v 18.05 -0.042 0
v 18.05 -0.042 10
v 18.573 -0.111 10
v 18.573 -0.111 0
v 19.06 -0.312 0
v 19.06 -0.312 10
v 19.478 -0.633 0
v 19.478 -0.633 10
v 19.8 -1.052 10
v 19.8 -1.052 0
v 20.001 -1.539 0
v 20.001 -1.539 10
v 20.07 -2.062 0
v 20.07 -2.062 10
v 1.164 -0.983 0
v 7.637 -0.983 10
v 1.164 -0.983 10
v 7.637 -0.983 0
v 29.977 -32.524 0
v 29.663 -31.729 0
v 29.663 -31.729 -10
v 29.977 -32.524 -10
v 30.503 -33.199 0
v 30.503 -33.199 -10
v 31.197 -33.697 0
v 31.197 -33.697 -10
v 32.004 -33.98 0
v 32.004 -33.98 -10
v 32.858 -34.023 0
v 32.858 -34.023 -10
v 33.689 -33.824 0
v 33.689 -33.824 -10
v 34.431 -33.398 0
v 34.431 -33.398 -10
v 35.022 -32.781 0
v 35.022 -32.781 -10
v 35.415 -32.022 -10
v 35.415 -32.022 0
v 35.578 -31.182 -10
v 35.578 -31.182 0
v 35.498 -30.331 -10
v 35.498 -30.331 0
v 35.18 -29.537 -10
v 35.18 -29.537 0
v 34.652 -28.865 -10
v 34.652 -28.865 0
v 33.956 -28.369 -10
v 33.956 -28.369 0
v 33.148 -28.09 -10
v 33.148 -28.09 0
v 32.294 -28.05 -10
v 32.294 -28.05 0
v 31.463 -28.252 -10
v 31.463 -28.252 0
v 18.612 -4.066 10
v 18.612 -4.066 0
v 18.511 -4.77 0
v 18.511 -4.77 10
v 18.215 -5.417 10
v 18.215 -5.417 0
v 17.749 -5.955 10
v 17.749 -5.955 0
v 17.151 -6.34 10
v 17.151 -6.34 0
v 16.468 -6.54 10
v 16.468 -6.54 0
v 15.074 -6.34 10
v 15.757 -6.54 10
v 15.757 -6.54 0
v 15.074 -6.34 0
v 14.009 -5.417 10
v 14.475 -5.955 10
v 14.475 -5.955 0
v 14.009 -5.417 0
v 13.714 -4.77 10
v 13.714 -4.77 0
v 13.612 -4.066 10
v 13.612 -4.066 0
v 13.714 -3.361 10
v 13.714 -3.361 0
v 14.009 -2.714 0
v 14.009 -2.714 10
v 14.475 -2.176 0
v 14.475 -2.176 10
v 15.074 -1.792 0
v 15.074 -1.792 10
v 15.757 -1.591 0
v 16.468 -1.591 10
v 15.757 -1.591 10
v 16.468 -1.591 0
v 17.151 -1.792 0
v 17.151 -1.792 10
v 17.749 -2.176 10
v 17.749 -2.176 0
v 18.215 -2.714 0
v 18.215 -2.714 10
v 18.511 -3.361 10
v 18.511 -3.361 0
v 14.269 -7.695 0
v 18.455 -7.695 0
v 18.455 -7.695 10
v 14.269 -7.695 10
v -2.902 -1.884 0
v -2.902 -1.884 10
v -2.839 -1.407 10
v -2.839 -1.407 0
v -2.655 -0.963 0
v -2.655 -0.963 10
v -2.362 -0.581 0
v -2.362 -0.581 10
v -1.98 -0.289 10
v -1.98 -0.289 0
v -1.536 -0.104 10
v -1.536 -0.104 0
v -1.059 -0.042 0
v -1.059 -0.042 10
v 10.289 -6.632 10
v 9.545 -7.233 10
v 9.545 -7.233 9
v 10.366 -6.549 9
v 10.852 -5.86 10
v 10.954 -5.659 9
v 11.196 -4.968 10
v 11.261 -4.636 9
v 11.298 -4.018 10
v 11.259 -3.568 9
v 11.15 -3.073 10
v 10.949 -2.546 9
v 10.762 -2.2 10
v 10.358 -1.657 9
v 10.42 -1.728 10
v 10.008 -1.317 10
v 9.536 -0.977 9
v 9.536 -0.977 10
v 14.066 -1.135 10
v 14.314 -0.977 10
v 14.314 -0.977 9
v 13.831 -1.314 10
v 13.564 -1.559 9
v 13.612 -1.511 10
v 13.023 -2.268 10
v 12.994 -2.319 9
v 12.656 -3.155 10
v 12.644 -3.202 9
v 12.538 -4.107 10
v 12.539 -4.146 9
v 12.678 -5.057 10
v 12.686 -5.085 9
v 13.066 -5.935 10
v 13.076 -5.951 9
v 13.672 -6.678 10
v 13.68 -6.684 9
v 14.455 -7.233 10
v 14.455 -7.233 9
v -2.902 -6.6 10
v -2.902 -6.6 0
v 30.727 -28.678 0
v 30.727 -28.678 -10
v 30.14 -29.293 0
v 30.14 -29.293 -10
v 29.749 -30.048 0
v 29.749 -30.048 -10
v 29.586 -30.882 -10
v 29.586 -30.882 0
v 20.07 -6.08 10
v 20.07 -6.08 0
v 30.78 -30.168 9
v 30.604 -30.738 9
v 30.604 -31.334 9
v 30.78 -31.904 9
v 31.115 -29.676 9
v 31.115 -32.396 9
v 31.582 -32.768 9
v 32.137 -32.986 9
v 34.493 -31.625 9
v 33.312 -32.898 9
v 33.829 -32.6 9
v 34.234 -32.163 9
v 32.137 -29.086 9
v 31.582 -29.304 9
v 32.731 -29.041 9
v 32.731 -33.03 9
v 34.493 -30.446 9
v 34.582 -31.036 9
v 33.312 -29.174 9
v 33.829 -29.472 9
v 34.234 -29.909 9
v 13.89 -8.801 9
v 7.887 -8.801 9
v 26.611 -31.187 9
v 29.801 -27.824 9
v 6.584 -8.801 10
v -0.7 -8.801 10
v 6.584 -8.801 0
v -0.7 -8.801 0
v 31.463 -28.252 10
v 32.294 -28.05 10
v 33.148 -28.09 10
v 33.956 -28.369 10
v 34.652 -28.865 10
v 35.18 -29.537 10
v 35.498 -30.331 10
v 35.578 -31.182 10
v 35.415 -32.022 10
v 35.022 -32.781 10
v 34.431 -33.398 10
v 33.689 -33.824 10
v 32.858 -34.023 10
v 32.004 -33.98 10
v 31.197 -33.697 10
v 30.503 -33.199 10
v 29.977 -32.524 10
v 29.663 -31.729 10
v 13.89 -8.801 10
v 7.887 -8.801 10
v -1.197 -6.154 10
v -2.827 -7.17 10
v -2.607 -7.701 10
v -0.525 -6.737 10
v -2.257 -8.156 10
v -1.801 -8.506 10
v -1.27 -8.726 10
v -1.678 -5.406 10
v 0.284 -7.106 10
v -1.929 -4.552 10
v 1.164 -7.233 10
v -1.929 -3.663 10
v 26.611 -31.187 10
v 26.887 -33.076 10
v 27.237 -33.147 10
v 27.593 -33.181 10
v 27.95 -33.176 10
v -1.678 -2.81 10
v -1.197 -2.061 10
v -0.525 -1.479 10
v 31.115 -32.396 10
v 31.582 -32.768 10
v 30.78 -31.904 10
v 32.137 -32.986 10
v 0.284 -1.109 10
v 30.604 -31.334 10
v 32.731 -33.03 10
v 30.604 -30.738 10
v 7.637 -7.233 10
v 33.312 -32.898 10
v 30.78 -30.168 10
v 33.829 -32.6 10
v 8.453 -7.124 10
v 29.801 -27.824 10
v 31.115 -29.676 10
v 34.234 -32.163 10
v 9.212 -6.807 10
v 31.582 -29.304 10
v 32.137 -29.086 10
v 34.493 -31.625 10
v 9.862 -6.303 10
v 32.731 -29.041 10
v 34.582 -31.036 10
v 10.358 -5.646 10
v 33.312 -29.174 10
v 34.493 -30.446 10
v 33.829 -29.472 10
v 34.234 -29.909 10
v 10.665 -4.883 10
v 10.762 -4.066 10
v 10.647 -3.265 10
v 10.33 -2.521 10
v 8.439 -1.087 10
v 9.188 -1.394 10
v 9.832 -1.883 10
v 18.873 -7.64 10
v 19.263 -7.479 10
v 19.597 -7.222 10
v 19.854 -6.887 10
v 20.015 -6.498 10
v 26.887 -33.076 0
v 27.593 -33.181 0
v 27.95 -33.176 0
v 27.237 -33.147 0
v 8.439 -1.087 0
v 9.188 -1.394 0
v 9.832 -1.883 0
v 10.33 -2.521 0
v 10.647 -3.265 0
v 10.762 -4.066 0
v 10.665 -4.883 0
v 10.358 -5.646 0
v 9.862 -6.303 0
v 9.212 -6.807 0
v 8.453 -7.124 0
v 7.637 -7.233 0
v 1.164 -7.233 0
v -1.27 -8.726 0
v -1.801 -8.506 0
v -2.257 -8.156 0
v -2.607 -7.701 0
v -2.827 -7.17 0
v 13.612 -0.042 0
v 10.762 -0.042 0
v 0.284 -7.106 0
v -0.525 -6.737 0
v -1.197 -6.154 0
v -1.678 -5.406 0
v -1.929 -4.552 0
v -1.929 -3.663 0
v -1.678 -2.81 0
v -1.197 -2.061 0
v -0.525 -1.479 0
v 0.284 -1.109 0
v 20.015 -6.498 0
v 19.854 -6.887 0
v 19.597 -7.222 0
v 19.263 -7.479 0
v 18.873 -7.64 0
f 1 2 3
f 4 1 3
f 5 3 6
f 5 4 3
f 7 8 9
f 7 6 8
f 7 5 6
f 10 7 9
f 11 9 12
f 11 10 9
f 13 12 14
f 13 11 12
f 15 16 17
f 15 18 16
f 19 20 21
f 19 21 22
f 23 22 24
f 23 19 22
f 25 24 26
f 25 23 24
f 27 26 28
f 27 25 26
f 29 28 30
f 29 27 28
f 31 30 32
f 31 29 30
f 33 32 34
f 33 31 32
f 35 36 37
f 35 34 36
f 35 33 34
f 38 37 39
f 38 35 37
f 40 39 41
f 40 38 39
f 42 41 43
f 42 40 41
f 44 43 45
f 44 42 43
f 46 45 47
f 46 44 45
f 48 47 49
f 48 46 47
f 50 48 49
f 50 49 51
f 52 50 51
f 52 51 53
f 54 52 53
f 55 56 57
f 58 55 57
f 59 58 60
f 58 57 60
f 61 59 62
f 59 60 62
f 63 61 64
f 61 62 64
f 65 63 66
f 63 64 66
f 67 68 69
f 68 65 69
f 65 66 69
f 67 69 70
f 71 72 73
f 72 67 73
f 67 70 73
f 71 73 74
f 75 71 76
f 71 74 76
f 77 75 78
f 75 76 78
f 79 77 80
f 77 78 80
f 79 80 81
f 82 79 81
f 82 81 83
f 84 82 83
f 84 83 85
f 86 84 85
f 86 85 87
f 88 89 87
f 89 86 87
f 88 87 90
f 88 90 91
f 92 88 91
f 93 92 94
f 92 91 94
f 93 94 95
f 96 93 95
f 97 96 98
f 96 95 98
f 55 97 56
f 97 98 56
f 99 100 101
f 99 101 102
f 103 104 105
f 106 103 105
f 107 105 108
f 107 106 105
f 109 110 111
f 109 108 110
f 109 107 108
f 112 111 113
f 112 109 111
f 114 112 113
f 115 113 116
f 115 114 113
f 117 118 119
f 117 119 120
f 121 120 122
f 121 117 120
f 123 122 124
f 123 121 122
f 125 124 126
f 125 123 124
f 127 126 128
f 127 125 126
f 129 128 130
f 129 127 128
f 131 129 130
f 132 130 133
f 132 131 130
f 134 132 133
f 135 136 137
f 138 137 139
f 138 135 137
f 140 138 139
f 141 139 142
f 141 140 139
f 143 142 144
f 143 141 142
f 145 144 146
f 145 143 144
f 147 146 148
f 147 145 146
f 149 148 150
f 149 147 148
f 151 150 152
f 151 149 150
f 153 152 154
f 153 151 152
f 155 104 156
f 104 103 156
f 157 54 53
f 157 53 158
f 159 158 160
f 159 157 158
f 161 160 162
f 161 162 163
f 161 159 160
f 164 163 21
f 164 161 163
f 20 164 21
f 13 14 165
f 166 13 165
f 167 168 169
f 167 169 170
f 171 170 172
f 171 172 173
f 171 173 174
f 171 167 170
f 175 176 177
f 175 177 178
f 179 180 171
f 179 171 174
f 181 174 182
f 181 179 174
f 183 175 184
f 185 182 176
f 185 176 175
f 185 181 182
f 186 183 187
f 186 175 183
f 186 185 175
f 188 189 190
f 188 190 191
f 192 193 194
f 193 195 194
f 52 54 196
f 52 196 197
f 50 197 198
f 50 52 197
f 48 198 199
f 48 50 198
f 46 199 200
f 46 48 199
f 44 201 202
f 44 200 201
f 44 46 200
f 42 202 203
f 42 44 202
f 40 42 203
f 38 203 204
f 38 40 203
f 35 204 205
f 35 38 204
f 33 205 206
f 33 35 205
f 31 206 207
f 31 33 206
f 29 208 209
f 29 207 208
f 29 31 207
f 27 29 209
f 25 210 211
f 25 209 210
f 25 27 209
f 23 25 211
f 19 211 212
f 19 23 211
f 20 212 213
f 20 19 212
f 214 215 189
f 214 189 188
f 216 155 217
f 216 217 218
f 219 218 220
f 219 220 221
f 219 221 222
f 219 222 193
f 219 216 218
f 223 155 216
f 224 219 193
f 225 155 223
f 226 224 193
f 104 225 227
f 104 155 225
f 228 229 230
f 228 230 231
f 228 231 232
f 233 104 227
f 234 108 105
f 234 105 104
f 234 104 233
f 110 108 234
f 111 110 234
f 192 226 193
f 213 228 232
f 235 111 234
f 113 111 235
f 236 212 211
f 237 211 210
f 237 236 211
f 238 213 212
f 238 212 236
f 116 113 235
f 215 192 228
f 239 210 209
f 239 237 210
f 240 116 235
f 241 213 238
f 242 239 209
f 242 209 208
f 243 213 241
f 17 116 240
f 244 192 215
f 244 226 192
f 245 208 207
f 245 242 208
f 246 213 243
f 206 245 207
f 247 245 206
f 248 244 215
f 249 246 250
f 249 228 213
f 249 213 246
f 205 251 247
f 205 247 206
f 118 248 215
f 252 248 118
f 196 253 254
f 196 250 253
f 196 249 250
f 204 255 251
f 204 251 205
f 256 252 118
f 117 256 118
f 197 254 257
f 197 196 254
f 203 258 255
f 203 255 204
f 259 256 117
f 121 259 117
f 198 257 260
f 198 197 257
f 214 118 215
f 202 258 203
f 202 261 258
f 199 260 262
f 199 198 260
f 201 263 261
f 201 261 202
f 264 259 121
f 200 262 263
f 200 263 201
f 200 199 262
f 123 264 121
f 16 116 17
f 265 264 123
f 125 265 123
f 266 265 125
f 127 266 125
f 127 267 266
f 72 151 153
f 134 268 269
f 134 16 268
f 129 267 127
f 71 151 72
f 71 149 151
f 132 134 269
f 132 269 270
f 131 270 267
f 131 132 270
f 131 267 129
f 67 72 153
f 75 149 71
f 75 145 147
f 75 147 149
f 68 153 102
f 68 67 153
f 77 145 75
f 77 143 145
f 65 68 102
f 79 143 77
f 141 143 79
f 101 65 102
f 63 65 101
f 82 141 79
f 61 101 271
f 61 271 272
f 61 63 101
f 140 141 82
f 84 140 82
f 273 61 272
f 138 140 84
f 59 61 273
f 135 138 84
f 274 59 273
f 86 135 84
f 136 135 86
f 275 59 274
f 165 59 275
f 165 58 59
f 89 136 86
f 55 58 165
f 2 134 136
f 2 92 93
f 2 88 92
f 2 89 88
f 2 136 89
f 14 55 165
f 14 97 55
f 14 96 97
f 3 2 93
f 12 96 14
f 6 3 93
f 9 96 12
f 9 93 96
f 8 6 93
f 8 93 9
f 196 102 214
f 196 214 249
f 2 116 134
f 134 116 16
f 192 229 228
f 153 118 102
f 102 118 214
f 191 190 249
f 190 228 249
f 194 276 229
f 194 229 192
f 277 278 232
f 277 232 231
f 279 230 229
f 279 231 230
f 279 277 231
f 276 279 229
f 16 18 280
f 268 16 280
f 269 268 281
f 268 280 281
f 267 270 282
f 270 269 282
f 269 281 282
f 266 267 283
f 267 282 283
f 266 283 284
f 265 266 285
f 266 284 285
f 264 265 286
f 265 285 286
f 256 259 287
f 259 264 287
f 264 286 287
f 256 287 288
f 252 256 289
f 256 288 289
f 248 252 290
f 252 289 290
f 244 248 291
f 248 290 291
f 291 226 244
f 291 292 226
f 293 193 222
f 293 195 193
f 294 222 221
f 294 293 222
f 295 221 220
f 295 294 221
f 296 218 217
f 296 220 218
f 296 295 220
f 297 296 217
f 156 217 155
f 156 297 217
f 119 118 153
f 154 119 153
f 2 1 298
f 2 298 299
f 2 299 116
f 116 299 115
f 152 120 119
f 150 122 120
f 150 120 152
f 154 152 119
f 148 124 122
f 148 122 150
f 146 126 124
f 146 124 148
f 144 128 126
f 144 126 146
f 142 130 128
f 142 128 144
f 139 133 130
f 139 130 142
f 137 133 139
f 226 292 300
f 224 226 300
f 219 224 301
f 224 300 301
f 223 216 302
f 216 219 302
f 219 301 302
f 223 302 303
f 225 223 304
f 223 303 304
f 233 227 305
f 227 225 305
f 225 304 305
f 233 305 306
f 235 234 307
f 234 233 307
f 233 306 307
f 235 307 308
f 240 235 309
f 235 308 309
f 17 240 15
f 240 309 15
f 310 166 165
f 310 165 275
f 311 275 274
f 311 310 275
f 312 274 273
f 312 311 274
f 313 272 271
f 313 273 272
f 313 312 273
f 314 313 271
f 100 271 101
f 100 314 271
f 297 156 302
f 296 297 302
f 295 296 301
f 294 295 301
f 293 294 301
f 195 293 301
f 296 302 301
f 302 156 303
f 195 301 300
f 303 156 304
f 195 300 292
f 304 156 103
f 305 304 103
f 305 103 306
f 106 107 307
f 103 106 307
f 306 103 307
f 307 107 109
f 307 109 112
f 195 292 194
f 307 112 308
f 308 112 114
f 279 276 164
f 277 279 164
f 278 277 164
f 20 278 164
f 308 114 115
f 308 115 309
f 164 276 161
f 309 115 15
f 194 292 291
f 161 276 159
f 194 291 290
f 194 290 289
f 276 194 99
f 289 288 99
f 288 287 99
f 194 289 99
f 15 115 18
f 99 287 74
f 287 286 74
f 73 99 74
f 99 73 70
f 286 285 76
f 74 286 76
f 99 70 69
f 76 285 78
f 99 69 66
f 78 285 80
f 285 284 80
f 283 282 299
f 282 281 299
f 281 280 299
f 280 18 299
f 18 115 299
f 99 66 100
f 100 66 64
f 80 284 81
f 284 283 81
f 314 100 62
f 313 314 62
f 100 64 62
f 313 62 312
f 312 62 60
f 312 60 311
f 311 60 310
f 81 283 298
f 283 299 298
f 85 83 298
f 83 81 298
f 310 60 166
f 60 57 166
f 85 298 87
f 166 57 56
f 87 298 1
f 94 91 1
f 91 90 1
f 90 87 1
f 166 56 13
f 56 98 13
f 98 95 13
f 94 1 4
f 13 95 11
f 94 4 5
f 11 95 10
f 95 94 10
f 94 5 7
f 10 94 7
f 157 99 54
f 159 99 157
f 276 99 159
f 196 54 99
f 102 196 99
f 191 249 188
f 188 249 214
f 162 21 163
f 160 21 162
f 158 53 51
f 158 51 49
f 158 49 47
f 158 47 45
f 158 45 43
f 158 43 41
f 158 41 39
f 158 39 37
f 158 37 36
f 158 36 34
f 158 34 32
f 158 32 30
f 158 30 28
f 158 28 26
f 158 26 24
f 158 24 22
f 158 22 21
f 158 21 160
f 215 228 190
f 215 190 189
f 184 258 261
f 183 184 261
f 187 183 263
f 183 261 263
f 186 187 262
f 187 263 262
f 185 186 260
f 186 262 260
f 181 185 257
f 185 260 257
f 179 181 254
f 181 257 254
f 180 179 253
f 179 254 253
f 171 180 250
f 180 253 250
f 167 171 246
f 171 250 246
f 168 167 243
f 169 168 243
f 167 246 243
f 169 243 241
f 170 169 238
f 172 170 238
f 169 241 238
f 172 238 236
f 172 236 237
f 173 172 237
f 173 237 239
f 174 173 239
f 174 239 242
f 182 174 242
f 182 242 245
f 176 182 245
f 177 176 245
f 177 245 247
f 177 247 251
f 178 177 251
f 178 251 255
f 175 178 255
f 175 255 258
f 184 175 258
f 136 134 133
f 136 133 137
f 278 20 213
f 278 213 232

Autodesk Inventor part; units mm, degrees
ref_plane "YZ Plane" through (0, 0, 0) normal (1, 0, 0) x (0, 1, 0)
ref_plane "XZ Plane" through (0, 0, 0) normal (0, 1, 0) x (-1, 0, 0)
ref_plane "XY Plane" through (0, 0, 0) normal (0, 0, 1) x (1, 0, 0)
sketch "スケッチ1" plane through (0, 0, 0) normal (0, 0, 1) x (1, 0, 0)
  line L0 (18.4549, -7.695) -> (14.2688, -7.695)
  arc A0 (18.4549, -7.695) -> (20.0703, -6.0796) centre (18.4549, -6.0796) ccw
  line L1 (20.0703, -2.0624) -> (20.0703, -6.0796)
  line L2 (18.0495, -0.0417) -> (-1.0589, -0.0417)
  arc A1 (-1.0589, -0.0417) -> (-2.9016, -1.8843) centre (-1.0589, -1.8843) ccw
  line L3 (-2.9016, -1.8843) -> (-2.9016, -6.5999)
  arc A2 (-2.9016, -6.5999) -> (-0.7003, -8.8011) centre (-0.7003, -6.5999) ccw
  arc A3 (26.8872, -33.0759) -> (27.9503, -33.1763) centre (27.7277, -29.8571) ccw
  line L4 (29.6628, -31.7291) -> (27.9503, -33.1763)
  arc A4 (29.6628, -31.7291) -> (31.463, -28.2522) centre (32.5816, -31.0359) ccw
  line L5 (31.463, -28.2522) -> (14.2688, -7.695)
  circle A5 centre (16.1123, -4.0657) radius 2.5
  line L6 (7.6373, -0.9827) -> (1.1644, -0.9827)
  arc A6 (7.6373, -7.2327) -> (7.6373, -0.9827) centre (7.6373, -4.1077) ccw
  arc A7 (1.1644, -0.9827) -> (1.1644, -7.2327) centre (1.1644, -4.1077) ccw
  line L7 (26.8872, -33.0759) -> (6.5837, -8.8011)
  line L8 (-0.7003, -8.8011) -> (6.5837, -8.8011)
  arc A8 (20.0703, -2.0624) -> (18.0495, -0.0417) centre (18.0495, -2.0624) ccw
  line L9 (1.1644, -7.2327) -> (7.6373, -7.2327)
  line L10 (13.6123, -4.0657) -> (13.6123, 1.3375)
  line L11 (10.7623, -4.0657) -> (10.7623, 0.9924)
  point P0 (0, 0)
  point P1 (0, 0)
  point P2 (0, 0)
  dimension "d0" = 5
  dimension "d1" = 3.125
  dimension "d2" = 4.8539
  dimension "d3" = 4.066
  dimension "d4" = 4.066
  dimension "d5" = 90
  dimension "d6" = 90
  dimension "d7" = 3.125
  dimension "d8" = 3.9579
  dimension "d9" = 22.9718
  dimension "d10" = 3
  dimension "d11" = 2.85
extrude "押し出し1" add sketch "スケッチ1" along normal blind 10
sketch "スケッチ2" plane through (0, 0, 0) normal (0, 0, -1) x (-1, 0, 0)
  arc A0 (-31.463, -28.2522) -> (-29.6628, -31.7291) centre (-32.5816, -31.0359) ccw projected
  circle A1 centre (-32.5816, -31.0359) radius 3
  point P0 (0, 0)
extrude "押し出し2" add sketch "スケッチ2" along normal blind 10
sketch "スケッチ3" plane through (0, 0, 10) normal (0, 0, 1) x (1, 0, 0)
  line L0 (6.5837, -8.8011) -> (26.8872, -33.0759) projected
  line L1 (31.463, -28.2522) -> (14.2688, -7.695) projected
  line L2 (6.5837, -8.8011) -> (15.194, -8.8011)
  line L3 (26.8872, -33.0759) -> (31.463, -28.2522)
  line L4 (31.463, -28.2522) -> (15.194, -8.8011)
  line L5 (26.8872, -33.0759) -> (6.5837, -8.8011)
  line L6 (25.9184, -31.9176) -> (30.4942, -27.0939)
  line L7 (26.6112, -31.1873) -> (7.8873, -8.8011)
  line L8 (29.8014, -27.8243) -> (13.8903, -8.8011)
  point P0 (0, 0)
  dimension "d16" = 1.5
  dimension "d17" = 1
  dimension "d18" = 1
extrude "押し出し3" cut sketch "スケッチ3" against normal blind 1 contours L2 L8 L6 L7
sketch "スケッチ4" plane through (0, 0, 10) normal (0, 0, 1) x (1, 0, 0)
  arc A0 (7.6373, -7.2327) -> (7.6373, -0.9827) centre (7.6373, -4.1077) ccw projected
  circle A1 centre (16.1123, -4.0657) radius 2.5 projected
  line L0 (18.0495, -0.0417) -> (-1.0589, -0.0417) projected
  line L1 (14.2688, -7.695) -> (18.4549, -7.695) projected
  line L2 (7.8873, -8.8011) -> (13.8903, -8.8011) projected
  line L3 (13.8903, -8.8011) -> (29.8014, -27.8243) projected
  line L4 (29.8014, -27.8243) -> (26.6112, -31.1873) projected
  line L5 (26.6112, -31.1873) -> (7.8873, -8.8011) projected
  line L6 (7.8873, -8.8011) -> (13.8903, -8.8011) projected
  arc A2 (7.6373, -7.2327) -> (7.6373, -0.9827) centre (7.6373, -4.1077) ccw projected
  line L7 (7.6373, -7.2327) -> (1.1644, -7.2327) projected
  arc A3 (1.1644, -0.9827) -> (1.1644, -7.2327) centre (1.1644, -4.1077) ccw projected
  line L8 (1.1644, -0.9827) -> (7.6373, -0.9827) projected
  circle A4 centre (16.1123, -4.0657) radius 2.5 projected
  line L9 (14.2688, -7.695) -> (18.4549, -7.695) projected
  arc A5 (18.4549, -7.695) -> (20.0703, -6.0796) centre (18.4549, -6.0796) ccw projected
  line L10 (20.0703, -6.0796) -> (20.0703, -2.0624) projected
  arc A6 (20.0703, -2.0624) -> (18.0495, -0.0417) centre (18.0495, -2.0624) ccw projected
  line L11 (18.0495, -0.0417) -> (-1.0589, -0.0417) projected
  arc A7 (-1.0589, -0.0417) -> (-2.9016, -1.8843) centre (-1.0589, -1.8843) ccw projected
  line L12 (-2.9016, -1.8843) -> (-2.9016, -6.5999) projected
  arc A8 (-2.9016, -6.5999) -> (-0.7003, -8.8011) centre (-0.7003, -6.5999) ccw projected
  line L13 (-0.7003, -8.8011) -> (6.5837, -8.8011) projected
  line L14 (6.5837, -8.8011) -> (26.8872, -33.0759) projected
  arc A9 (26.8872, -33.0759) -> (27.9503, -33.1763) centre (27.7277, -29.8571) ccw projected
  line L15 (27.9503, -33.1763) -> (29.6628, -31.7291) projected
  arc A10 (29.6628, -31.7291) -> (31.463, -28.2522) centre (32.5816, -31.0359) ccw projected
  line L16 (31.463, -28.2522) -> (14.2688, -7.695) projected
  arc A11 (9.5454, -7.2327) -> (9.5355, -0.9767) centre (7.6373, -4.1077) ccw
  arc A12 (14.3143, -0.9767) -> (14.4552, -7.2327) centre (16.1123, -4.0657) ccw
  line L17 (9.5454, -7.2327) -> (14.4552, -7.2327)
  line L18 (9.5355, -0.9767) -> (14.3143, -0.9767)
  point P0 (0, 0)
extrude "押し出し4" cut sketch "スケッチ4" against normal blind 1 contours A11 L18 A12 L17
sketch "スケッチ5" plane through (0, 0, 10) normal (0, 0, 1) x (1, 0, 0)
  arc A0 (29.6628, -31.7291) -> (31.463, -28.2522) centre (32.5816, -31.0359) ccw projected
  circle A1 centre (32.5816, -31.0359) radius 2
  circle A2 centre (32.5816, -31.0359) radius 3
  point P0 (0, 0)
  dimension "d23" = 1
  dimension "d24" = 1
extrude "押し出し5" cut sketch "スケッチ5" against normal blind 1 contours A1
equation "\"d4\" = d3"
equation "\"d7\" = d1"
properties part number "finger_4_6mm"
